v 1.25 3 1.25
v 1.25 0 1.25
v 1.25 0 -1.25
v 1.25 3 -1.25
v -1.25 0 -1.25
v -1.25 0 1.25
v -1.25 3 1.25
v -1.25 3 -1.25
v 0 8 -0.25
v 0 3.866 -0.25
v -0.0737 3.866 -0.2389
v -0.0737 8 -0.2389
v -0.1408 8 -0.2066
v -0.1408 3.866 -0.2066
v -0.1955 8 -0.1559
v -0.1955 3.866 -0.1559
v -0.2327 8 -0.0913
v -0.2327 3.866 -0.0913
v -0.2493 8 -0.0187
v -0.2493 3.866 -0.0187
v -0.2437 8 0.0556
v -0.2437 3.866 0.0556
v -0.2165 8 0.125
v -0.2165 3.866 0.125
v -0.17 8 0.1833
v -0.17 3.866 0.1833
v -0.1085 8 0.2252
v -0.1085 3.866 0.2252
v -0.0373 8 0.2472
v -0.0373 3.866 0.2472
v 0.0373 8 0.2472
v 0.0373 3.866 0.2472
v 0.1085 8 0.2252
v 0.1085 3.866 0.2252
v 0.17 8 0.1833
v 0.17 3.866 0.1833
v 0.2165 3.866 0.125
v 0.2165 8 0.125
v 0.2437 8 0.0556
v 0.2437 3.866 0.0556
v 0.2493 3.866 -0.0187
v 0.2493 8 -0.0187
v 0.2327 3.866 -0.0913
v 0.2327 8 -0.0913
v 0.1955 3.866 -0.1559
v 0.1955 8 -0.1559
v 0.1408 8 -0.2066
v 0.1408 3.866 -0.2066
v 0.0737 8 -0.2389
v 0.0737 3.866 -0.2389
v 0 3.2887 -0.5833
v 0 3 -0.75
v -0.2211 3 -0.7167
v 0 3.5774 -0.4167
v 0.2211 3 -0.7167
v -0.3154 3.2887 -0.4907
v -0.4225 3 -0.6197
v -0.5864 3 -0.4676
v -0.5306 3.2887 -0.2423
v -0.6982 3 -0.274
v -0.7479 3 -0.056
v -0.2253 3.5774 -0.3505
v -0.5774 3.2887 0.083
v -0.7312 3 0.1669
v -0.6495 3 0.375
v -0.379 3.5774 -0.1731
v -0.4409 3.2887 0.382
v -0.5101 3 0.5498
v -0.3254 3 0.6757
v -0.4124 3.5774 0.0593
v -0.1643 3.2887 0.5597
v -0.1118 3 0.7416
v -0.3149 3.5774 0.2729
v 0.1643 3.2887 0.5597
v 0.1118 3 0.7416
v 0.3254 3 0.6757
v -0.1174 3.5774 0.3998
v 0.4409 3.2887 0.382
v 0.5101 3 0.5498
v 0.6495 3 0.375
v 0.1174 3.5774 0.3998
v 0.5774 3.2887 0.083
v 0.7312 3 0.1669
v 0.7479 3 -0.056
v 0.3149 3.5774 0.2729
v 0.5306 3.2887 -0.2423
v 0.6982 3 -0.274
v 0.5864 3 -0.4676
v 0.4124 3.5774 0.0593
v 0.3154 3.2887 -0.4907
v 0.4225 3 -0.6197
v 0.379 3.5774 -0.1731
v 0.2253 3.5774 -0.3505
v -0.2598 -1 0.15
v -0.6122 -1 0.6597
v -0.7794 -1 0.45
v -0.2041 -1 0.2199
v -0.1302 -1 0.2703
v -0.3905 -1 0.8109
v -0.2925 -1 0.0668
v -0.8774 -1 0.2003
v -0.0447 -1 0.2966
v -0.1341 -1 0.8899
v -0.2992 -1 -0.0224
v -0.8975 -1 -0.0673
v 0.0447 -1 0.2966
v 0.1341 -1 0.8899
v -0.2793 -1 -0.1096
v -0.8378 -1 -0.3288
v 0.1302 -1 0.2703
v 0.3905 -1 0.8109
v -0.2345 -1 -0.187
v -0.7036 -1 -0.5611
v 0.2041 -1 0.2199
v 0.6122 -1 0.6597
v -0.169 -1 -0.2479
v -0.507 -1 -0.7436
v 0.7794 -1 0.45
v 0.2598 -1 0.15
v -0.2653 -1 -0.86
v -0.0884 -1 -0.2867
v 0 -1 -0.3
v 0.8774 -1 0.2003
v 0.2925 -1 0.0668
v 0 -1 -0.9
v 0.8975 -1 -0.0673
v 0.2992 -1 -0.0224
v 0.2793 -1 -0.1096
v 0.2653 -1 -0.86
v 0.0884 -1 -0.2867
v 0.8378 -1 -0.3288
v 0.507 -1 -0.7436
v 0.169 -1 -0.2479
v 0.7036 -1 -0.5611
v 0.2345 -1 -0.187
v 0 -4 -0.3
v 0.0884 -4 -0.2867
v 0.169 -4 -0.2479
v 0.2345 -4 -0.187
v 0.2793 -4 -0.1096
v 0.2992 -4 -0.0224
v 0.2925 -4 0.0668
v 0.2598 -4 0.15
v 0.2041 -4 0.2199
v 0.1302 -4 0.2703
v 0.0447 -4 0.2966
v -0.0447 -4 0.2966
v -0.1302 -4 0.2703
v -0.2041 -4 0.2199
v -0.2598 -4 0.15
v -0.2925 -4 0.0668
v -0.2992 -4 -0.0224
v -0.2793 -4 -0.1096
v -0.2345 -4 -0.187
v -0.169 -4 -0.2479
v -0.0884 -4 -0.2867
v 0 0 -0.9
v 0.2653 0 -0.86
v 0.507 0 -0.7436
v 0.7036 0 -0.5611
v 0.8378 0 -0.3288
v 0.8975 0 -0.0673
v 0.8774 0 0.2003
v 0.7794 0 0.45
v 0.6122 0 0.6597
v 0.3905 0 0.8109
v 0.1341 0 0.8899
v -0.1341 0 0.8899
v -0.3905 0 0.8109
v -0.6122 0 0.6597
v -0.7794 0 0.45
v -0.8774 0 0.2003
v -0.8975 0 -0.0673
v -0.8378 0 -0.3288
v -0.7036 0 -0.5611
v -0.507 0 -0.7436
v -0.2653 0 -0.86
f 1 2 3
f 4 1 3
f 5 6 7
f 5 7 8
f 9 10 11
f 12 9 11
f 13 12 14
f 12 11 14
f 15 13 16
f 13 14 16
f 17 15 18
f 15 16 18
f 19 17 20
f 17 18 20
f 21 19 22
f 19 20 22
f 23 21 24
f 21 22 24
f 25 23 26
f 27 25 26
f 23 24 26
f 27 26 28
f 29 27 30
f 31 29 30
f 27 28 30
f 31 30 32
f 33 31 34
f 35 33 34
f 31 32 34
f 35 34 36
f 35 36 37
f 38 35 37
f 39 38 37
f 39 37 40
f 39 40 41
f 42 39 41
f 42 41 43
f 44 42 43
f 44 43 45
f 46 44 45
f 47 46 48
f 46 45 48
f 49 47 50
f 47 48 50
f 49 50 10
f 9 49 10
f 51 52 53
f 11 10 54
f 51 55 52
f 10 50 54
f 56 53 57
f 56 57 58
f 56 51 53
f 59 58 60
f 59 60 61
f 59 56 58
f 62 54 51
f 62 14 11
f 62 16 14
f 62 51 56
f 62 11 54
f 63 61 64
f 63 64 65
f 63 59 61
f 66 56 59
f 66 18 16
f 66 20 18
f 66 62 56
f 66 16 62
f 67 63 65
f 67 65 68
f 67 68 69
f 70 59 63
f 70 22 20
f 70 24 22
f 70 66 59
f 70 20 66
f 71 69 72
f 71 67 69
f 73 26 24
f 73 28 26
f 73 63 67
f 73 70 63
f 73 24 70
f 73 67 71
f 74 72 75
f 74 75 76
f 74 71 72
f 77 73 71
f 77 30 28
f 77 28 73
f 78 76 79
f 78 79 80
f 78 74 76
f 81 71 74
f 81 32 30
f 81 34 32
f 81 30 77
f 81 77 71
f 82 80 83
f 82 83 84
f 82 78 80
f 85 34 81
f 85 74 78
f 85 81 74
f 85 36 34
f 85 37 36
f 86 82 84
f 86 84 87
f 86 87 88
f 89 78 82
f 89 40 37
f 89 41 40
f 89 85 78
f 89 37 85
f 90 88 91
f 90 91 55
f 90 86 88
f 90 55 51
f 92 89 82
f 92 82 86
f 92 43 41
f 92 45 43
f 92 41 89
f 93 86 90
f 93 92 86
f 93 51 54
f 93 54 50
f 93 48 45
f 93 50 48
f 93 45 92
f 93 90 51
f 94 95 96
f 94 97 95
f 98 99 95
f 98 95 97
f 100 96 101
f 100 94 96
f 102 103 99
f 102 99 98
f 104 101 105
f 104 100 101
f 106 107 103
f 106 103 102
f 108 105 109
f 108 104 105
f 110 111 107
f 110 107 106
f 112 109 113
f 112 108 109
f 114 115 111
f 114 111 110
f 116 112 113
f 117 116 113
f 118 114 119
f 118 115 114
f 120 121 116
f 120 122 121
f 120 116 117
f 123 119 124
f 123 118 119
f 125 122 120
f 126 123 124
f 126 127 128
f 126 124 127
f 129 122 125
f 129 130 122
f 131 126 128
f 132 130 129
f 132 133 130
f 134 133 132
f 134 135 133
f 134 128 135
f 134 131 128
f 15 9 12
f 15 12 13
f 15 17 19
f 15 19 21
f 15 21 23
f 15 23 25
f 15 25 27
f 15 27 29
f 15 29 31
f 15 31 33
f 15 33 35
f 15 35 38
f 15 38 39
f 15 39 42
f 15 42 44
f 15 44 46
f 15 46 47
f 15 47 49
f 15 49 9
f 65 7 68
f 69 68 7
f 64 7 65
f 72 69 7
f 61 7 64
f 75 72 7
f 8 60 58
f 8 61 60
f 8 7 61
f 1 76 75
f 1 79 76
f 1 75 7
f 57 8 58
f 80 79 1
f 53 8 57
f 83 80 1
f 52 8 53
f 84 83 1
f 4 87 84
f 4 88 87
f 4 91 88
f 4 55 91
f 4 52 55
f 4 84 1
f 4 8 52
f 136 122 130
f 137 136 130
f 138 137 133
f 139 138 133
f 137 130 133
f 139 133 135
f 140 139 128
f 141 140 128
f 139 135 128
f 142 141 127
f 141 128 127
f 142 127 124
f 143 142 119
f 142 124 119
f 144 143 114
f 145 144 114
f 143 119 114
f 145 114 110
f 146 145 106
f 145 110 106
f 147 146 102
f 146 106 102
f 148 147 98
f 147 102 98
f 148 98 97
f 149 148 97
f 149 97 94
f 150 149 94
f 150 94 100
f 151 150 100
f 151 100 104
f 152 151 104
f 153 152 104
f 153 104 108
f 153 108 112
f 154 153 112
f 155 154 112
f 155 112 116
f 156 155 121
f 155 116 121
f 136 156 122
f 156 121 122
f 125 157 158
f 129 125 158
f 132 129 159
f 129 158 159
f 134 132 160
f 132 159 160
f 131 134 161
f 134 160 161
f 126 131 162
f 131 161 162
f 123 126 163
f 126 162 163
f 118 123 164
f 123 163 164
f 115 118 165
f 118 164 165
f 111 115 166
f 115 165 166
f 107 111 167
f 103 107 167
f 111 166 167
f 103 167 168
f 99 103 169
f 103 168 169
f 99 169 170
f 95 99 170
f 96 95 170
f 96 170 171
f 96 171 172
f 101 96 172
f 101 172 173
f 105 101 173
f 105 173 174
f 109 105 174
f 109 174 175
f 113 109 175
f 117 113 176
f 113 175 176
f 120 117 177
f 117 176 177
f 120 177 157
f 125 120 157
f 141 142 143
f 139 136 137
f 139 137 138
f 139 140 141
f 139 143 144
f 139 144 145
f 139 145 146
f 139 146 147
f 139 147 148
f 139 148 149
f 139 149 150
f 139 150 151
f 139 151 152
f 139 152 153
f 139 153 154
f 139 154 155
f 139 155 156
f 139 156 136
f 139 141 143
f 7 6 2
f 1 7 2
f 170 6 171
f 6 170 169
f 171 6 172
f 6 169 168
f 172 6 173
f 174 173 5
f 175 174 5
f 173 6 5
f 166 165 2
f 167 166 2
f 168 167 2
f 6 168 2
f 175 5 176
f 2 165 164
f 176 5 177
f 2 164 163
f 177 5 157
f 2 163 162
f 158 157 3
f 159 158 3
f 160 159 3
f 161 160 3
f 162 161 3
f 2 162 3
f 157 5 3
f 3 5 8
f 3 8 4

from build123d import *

# Parameters (mm, degrees)
SKETCH_1_W      = 2.5
SKETCH_1_H      = 2.5
EXTRUDE_1_DEPTH = 3
SKETCH_3_R      = 0.9
EXTRUDE_2_DEPTH = 1
SKETCH_4_R      = 0.3
EXTRUDE_3_DEPTH = 3
SKETCH_5_R      = 0.25
EXTRUDE_4_DEPTH = 5
CHAMFER_1_SIZE  = 0.5
CHAMFER_1_SIZE2 = 0.866025404


with BuildPart() as part:
    # Эскиз1 → Бобышка-Вытянуть1 (new body)
    with BuildSketch(Plane(origin=(0, 0, 0), x_dir=(1, 0, 0), z_dir=(0, 1, 0))):
        Rectangle(SKETCH_1_W, SKETCH_1_H)
    extrude(amount=EXTRUDE_1_DEPTH)

    # Эскиз3 → Бобышка-Вытянуть2 (add)
    with BuildSketch(Plane.XZ):
        with Locations(Location((0, 0, 0), (0, 0, 270))):
            Circle(SKETCH_3_R)
    extrude(amount=EXTRUDE_2_DEPTH)

    # Эскиз4 → Бобышка-Вытянуть3 (add)
    with BuildSketch(Plane.XZ.offset(1)):
        with Locations(Location((0, 0, 0), (0, 0, 270))):
            Circle(SKETCH_4_R)
    extrude(amount=EXTRUDE_3_DEPTH)

    # Эскиз5 → Бобышка-Вытянуть4 (add)
    with BuildSketch(Plane(origin=(0, 3, 0), x_dir=(1, 0, 0), z_dir=(0, 1, 0))):
        with Locations(Location((0, 0, 0), (0, 0, 90))):
            Circle(SKETCH_5_R)
    extrude(amount=EXTRUDE_4_DEPTH)

    # Фаска1
    chamfer_1_edges = [part.edges().sort_by_distance(p)[0] for p in [
        (0, 3, 0.25),
    ]]
    chamfer_1_side = [part.faces().sort_by_distance(p)[0] for p in [
        (0, 3, -1.214644661),
    ]]
    chamfer(chamfer_1_edges, length=CHAMFER_1_SIZE, length2=CHAMFER_1_SIZE2, reference=chamfer_1_side[0])


solid = part.part
